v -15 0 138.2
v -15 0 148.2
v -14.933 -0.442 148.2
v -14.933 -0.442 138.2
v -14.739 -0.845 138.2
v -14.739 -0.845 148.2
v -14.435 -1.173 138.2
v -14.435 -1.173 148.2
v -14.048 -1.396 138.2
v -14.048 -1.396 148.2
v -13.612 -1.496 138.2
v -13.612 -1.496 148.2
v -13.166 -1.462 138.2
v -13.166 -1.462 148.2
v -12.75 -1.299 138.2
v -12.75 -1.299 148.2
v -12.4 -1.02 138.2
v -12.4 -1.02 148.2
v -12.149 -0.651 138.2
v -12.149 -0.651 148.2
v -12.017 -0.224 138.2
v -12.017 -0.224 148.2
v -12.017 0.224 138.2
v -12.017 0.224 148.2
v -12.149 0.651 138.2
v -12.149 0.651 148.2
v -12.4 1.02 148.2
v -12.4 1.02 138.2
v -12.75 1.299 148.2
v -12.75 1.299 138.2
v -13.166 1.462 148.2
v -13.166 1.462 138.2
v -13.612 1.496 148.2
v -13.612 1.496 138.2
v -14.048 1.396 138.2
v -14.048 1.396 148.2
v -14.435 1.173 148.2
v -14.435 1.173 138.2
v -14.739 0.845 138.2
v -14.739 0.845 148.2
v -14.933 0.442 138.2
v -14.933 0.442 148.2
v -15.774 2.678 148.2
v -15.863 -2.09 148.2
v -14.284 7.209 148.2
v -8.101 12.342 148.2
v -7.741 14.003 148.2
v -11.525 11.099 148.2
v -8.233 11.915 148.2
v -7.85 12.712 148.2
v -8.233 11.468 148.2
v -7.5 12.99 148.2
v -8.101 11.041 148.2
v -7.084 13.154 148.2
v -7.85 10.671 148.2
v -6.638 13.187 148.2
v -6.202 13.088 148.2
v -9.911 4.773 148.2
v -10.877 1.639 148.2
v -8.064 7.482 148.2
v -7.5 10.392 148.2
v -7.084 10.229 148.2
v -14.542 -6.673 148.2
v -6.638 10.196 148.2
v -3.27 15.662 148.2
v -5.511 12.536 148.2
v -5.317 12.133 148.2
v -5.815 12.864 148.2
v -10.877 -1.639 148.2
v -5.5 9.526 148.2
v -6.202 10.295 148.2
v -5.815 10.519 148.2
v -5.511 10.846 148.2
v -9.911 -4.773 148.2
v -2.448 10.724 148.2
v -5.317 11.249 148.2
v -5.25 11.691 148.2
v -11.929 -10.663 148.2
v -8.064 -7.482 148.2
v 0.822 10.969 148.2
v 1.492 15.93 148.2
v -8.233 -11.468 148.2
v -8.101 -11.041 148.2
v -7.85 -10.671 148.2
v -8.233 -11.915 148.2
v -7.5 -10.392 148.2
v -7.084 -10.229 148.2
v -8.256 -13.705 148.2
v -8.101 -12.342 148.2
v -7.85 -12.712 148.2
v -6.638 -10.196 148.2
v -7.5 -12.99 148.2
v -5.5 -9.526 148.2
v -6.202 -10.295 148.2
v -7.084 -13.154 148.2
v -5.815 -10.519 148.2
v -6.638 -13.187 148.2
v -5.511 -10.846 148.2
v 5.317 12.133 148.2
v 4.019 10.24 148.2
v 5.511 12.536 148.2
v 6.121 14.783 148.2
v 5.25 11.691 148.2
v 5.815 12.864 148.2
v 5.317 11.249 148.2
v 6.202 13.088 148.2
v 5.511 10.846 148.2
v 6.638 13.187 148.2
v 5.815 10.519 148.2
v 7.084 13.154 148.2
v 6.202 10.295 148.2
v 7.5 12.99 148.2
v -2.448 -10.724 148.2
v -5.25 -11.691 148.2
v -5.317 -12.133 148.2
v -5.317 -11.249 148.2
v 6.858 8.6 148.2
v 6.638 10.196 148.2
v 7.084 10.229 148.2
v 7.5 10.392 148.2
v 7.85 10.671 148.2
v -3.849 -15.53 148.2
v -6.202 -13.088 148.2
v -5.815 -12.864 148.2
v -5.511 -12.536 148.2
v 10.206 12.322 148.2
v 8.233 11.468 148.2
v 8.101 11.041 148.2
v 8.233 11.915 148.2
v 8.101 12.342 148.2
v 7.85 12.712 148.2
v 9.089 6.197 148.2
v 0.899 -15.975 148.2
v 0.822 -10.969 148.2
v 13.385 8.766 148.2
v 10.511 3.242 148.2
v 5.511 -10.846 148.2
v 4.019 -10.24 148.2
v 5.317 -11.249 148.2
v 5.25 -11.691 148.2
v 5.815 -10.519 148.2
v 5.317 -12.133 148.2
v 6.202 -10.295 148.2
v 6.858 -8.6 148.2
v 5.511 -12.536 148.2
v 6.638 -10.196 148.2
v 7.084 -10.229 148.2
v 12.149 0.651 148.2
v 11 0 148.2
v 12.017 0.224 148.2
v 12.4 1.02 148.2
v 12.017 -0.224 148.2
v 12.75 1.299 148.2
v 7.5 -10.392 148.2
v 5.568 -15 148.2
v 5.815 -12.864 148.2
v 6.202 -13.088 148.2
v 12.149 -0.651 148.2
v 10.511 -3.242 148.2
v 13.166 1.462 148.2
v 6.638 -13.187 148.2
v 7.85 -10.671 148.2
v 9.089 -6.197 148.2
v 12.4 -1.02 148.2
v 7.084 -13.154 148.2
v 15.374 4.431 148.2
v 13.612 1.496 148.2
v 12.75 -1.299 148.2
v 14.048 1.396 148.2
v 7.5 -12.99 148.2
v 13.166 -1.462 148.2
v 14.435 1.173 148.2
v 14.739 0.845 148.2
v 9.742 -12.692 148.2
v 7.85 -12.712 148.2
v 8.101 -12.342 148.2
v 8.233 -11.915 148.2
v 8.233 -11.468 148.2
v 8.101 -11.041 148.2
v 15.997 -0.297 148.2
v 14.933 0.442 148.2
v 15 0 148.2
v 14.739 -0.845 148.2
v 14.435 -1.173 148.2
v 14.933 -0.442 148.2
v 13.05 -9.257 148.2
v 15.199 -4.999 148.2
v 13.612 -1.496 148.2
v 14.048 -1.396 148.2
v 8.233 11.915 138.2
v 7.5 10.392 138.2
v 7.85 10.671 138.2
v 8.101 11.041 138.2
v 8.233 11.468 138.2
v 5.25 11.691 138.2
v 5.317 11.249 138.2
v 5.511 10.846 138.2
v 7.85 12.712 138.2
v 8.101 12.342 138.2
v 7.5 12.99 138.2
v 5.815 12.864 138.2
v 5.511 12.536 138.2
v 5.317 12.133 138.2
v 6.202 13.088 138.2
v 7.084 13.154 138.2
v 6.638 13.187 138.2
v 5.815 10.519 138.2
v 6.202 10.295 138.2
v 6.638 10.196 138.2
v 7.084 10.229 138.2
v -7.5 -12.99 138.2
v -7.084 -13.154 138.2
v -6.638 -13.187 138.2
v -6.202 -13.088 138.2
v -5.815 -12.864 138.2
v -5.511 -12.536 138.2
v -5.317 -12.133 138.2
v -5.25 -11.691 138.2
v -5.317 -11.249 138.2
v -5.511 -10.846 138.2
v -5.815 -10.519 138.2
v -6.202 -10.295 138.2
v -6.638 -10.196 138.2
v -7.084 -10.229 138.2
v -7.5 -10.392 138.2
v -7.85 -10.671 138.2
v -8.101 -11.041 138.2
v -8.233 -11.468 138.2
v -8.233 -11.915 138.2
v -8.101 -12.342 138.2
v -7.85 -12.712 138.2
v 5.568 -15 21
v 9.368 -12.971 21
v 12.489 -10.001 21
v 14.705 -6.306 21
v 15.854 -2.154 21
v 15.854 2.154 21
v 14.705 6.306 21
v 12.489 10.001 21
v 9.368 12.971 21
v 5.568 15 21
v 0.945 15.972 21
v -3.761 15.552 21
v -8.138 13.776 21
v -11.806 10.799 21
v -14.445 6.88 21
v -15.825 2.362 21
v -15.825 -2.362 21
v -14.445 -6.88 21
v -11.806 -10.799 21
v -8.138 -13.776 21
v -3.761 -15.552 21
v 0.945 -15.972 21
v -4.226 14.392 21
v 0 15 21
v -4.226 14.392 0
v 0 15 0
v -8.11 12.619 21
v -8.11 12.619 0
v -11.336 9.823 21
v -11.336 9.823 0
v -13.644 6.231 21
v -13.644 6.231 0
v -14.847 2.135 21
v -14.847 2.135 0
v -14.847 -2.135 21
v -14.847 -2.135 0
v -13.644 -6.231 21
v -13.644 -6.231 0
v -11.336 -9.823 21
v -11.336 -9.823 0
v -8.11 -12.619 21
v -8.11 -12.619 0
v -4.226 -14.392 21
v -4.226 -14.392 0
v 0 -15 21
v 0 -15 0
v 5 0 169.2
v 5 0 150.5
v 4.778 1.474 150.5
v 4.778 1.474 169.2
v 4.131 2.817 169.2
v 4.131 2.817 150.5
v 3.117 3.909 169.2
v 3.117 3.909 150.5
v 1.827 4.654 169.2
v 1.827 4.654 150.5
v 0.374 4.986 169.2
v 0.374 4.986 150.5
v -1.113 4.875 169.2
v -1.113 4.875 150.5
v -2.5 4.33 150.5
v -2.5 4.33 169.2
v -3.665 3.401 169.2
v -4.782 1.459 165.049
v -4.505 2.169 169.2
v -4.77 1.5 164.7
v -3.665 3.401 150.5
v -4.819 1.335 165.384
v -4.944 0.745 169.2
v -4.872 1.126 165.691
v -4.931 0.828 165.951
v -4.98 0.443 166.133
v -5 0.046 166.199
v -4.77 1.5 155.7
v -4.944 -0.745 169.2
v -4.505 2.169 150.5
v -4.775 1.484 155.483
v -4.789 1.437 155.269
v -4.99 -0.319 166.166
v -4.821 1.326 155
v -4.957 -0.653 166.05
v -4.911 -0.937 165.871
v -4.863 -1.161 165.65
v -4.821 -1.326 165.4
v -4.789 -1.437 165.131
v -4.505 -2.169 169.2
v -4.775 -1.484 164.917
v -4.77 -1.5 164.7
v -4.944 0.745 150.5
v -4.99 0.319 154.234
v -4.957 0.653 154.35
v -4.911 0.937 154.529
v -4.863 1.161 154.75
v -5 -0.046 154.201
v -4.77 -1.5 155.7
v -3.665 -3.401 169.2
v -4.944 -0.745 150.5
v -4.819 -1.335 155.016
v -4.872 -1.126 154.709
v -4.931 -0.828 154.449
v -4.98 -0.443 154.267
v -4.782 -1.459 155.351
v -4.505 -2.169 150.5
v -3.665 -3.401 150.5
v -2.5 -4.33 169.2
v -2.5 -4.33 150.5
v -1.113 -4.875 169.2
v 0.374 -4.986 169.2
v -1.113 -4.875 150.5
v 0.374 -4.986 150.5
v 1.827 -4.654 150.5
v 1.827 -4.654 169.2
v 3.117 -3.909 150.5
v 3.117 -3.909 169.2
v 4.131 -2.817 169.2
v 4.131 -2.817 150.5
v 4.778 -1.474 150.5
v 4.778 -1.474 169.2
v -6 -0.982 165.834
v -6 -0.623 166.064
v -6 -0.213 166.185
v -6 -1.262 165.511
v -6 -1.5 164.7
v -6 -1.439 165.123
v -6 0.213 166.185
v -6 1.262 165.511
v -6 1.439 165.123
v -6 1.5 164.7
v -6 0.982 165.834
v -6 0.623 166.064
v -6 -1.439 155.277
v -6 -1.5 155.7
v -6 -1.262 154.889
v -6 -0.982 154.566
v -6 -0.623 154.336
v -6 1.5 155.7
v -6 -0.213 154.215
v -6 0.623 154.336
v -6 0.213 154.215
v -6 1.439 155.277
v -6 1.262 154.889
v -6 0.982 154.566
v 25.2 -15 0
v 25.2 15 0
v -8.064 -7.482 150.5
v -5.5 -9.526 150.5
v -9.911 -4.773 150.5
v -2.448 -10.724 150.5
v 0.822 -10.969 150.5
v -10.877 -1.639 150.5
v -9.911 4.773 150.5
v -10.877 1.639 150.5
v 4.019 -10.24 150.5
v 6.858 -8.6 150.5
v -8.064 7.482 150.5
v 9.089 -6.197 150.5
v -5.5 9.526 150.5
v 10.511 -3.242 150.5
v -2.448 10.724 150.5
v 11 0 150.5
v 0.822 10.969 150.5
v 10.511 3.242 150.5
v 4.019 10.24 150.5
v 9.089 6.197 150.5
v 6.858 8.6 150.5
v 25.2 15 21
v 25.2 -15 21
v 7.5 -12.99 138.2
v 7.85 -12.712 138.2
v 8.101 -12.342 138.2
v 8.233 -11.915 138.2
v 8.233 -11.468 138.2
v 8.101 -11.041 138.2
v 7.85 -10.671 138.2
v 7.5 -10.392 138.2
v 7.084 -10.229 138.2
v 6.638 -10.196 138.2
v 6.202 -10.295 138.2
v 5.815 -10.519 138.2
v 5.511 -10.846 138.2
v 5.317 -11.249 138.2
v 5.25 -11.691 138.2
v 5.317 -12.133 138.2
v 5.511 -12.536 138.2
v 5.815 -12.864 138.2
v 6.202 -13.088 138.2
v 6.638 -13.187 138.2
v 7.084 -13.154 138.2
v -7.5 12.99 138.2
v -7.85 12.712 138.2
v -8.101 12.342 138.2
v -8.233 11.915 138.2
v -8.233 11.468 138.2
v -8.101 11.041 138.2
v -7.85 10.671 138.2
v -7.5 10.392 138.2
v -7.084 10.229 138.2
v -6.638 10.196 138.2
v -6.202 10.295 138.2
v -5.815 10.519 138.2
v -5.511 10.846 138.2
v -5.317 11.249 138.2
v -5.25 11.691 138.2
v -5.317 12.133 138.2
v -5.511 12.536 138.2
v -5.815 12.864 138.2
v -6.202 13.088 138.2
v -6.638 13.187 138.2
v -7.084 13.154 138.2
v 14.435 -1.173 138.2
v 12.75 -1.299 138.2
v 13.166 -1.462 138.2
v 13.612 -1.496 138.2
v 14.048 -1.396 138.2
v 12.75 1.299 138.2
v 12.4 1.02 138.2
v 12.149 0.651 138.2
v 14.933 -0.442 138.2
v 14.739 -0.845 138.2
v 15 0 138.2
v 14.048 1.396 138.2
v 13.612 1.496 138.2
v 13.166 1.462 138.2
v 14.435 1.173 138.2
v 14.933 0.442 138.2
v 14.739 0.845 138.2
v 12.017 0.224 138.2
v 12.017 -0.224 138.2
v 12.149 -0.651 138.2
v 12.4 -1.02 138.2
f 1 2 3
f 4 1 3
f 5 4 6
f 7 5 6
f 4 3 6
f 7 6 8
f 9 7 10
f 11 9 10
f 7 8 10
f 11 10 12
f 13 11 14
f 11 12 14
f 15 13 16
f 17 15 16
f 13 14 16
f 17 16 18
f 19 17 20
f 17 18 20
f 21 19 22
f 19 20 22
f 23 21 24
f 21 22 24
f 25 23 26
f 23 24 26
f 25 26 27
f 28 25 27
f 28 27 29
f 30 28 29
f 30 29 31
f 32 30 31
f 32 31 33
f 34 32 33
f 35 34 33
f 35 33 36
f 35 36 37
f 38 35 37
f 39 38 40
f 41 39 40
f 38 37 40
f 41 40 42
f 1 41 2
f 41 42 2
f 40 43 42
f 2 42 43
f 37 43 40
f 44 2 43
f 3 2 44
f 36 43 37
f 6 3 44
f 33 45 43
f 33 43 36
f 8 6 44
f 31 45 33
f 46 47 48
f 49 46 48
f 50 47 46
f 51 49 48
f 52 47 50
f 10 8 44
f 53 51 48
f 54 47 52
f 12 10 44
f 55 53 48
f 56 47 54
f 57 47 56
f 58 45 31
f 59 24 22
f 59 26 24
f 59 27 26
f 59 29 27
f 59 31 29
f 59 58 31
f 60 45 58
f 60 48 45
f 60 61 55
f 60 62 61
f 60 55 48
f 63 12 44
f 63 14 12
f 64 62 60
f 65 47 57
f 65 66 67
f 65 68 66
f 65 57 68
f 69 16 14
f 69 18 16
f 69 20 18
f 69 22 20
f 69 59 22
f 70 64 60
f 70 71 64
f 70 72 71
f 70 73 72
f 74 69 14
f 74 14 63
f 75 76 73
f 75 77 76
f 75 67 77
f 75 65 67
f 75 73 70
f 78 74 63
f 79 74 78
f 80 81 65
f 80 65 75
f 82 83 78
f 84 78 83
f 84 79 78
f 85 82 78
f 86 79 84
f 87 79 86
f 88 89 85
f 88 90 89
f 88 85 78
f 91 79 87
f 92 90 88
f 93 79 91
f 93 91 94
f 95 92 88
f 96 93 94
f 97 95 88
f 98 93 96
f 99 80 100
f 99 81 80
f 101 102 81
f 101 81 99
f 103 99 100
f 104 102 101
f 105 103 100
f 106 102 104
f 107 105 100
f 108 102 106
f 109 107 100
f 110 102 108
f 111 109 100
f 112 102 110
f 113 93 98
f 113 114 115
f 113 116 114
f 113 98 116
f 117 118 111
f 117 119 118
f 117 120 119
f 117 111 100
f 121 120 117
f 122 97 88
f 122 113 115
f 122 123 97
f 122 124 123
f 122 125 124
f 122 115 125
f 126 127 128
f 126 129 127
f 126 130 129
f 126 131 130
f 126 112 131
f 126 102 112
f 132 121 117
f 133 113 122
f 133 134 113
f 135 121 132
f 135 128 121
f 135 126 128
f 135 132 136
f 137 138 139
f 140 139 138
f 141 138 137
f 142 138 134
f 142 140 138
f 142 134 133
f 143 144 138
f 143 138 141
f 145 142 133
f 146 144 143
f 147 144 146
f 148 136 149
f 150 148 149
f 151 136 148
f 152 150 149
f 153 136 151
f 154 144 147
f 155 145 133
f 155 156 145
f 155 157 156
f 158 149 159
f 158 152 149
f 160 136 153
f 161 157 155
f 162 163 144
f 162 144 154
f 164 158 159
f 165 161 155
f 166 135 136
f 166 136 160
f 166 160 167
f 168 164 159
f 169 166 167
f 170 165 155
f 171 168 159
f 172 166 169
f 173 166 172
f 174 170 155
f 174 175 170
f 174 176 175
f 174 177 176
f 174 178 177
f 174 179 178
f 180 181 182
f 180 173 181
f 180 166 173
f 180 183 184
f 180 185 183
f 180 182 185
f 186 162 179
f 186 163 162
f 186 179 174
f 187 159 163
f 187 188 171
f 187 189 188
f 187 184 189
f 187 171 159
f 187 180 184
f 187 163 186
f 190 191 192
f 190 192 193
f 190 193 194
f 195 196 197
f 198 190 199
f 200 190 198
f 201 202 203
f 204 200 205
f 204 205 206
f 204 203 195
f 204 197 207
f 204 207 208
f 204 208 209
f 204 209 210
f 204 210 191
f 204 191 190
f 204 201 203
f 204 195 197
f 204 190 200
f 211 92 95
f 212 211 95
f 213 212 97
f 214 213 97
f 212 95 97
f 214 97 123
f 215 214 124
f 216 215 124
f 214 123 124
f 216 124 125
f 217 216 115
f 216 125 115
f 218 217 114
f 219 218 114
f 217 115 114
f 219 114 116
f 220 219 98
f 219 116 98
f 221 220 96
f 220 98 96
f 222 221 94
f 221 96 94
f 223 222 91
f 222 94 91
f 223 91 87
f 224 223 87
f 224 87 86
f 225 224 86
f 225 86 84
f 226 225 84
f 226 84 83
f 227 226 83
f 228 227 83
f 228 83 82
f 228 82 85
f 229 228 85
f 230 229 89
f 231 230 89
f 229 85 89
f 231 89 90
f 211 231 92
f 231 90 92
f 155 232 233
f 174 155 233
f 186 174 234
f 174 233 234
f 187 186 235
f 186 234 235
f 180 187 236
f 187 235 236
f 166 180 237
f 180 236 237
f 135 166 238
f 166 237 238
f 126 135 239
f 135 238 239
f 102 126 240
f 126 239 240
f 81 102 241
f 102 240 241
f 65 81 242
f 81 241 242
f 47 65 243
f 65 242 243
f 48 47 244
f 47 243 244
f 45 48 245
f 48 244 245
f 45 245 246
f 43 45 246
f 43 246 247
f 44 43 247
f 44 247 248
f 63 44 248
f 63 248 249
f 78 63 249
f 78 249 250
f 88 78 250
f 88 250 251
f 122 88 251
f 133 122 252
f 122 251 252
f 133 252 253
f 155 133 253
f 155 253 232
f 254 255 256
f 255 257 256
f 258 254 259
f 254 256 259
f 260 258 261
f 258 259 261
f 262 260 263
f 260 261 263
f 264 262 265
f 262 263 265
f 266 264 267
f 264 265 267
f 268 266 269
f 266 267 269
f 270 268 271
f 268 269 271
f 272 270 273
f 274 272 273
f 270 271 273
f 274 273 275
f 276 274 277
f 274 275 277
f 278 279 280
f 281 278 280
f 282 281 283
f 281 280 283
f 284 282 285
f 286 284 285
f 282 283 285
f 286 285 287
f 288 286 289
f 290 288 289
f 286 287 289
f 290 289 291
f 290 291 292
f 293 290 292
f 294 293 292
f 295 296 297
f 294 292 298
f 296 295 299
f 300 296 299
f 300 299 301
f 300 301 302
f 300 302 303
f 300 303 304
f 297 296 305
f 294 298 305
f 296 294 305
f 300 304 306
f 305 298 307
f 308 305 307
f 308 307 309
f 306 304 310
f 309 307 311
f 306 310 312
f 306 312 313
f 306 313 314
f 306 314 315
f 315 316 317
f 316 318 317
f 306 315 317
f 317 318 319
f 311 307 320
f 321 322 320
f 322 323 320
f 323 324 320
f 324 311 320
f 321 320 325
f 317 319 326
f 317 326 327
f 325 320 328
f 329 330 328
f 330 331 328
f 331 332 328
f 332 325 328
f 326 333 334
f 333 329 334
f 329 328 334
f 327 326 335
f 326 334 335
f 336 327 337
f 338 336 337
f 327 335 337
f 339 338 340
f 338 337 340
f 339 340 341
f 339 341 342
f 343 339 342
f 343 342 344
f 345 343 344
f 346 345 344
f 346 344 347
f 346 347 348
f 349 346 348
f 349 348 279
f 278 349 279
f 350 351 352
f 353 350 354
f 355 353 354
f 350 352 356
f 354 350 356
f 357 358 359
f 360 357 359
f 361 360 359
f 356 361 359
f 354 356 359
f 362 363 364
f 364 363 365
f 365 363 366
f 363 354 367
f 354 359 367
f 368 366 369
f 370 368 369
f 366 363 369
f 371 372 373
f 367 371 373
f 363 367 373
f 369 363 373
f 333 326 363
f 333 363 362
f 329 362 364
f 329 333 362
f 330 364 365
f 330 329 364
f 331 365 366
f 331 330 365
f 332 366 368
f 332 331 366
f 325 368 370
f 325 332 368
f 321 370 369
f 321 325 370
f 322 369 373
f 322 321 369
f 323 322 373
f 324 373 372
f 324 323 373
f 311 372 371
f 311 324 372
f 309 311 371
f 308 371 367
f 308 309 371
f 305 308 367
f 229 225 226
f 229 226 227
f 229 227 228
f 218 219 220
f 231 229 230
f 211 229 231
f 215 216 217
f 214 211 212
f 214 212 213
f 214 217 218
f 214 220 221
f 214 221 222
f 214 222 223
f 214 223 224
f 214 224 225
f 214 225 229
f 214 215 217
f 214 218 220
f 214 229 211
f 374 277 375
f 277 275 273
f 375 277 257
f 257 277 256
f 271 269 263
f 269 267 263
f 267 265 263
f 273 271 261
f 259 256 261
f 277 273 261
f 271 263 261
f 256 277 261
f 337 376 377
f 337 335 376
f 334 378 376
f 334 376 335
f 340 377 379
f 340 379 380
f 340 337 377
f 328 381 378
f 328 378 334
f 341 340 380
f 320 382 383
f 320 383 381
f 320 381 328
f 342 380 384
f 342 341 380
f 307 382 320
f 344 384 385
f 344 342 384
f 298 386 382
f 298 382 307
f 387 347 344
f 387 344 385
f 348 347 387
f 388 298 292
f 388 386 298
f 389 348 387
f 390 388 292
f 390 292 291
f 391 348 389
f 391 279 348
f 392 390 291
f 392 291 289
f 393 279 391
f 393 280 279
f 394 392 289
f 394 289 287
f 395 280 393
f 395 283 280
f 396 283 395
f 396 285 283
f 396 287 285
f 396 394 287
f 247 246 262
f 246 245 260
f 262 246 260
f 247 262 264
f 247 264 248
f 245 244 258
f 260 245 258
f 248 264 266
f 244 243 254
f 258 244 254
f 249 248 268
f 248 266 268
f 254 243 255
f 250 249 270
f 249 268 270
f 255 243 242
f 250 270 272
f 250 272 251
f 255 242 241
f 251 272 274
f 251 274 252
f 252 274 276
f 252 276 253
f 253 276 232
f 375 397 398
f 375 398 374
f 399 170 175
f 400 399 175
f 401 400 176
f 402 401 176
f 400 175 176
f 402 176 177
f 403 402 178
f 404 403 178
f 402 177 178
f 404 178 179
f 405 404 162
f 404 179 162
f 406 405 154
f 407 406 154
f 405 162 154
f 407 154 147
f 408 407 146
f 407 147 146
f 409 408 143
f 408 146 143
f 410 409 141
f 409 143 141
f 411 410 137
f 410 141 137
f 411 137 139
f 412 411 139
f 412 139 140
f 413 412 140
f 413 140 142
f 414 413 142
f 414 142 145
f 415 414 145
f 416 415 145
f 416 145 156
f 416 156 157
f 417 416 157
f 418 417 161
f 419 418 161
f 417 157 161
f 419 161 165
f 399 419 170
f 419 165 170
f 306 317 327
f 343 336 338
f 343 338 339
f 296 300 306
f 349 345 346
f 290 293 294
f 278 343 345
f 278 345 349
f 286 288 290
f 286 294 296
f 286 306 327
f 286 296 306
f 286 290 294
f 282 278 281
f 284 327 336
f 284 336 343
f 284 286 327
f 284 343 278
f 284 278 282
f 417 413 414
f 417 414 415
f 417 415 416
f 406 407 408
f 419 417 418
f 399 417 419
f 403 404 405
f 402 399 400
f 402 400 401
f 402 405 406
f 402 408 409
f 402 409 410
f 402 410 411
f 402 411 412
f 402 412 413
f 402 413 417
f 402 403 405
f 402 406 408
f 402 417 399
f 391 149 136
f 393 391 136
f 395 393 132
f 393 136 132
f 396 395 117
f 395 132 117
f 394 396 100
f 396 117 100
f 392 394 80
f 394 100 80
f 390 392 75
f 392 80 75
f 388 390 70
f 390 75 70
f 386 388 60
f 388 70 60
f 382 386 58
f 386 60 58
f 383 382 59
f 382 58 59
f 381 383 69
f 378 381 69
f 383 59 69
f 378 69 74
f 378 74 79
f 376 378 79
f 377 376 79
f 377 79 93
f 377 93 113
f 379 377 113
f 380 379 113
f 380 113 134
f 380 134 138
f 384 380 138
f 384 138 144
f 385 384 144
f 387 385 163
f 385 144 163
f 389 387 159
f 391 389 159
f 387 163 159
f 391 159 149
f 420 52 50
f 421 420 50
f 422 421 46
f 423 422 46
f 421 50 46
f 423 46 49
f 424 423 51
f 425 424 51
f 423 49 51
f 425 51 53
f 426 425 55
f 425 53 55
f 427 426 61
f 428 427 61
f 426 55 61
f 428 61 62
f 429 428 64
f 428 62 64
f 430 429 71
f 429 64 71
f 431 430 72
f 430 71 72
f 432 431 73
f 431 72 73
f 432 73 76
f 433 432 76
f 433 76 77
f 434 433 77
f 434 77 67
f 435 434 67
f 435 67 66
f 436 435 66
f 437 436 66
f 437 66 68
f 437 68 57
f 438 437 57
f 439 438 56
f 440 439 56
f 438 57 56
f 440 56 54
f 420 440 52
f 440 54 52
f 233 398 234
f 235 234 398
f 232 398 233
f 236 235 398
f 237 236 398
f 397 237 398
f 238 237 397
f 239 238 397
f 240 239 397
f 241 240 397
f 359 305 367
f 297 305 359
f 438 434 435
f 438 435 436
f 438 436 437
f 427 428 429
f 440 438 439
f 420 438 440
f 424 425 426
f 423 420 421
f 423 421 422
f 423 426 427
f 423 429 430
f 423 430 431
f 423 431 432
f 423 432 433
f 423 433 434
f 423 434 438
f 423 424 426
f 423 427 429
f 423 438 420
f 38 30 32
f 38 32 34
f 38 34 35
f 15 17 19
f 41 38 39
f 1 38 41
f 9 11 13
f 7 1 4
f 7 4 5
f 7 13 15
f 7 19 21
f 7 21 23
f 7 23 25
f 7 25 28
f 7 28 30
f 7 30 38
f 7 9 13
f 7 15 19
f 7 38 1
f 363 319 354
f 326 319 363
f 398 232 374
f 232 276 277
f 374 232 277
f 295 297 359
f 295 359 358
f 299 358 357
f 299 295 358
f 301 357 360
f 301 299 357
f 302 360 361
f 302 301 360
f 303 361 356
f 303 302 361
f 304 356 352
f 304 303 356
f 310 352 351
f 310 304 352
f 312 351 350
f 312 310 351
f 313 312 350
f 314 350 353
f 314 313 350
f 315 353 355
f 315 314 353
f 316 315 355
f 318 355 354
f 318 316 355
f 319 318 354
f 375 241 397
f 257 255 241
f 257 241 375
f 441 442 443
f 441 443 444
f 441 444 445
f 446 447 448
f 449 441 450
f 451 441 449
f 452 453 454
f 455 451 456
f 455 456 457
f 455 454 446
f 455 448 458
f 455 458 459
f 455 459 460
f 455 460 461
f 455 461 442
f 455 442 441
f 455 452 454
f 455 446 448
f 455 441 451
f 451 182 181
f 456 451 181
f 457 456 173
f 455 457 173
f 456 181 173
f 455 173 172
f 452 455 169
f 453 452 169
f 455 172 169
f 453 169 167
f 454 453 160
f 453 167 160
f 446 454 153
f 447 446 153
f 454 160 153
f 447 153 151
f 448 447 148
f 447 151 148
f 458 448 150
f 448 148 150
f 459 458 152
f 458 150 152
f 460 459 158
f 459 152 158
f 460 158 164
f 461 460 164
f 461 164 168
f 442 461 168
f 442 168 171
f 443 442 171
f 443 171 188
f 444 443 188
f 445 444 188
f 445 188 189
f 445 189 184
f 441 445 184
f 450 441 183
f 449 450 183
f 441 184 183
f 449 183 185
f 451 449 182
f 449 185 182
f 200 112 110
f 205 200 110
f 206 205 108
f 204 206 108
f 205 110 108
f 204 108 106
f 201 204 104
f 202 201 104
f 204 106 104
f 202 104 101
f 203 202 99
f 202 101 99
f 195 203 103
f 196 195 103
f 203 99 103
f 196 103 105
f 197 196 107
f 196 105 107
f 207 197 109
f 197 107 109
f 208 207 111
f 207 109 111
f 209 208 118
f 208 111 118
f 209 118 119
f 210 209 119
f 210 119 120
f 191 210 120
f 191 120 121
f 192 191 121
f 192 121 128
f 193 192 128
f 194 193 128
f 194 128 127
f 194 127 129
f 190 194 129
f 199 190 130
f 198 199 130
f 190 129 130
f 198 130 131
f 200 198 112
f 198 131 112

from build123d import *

# Parameters (mm, degrees)
SKETCH1_R           = 15
BOSS_EXTRUDE1_DEPTH = 21
SKETCH2_W           = 21
SKETCH2_H           = 30
BOSS_EXTRUDE2_DEPTH = 25.2
SKETCH3_R           = 16
BOSS_EXTRUDE3_DEPTH = 127.2
SKETCH4_R           = 11
BOSS_EXTRUDE4_DEPTH = 2.3
SKETCH6_R           = 5
BOSS_EXTRUDE6_DEPTH = 18.7
BOSS_EXTRUDE7_DEPTH = 6
SKETCH7_R           = 1.5
CUT_EXTRUDE1_DEPTH  = 10
CIRPATTERN1_COUNT   = 6


with BuildPart() as part:
    # Sketch1 → Boss-Extrude1 (new body)
    with BuildSketch(Plane.XY):
        with Locations(Location((0, 0, 0), (0, 0, 180))):
            Circle(SKETCH1_R)
    extrude(amount=BOSS_EXTRUDE1_DEPTH)

    # Sketch2 → Boss-Extrude2 (add)
    with BuildSketch(Plane(origin=(0, 0, 0), x_dir=(0, 0, -1), z_dir=(1, 0, 0))):
        with Locations((-10.5, 0)):
            Rectangle(SKETCH2_W, SKETCH2_H)
    extrude(amount=BOSS_EXTRUDE2_DEPTH)

    # Sketch3 → Boss-Extrude3 (add)
    with BuildSketch(Plane.XY.offset(21)):
        with Locations(Location((0, 0, 0), (0, 0, 290.364134806))):
            Circle(SKETCH3_R)
    extrude(amount=BOSS_EXTRUDE3_DEPTH)

    # Sketch4 → Boss-Extrude4 (add)
    with BuildSketch(Plane.XY.offset(148.2)):
        Circle(SKETCH4_R)
    extrude(amount=BOSS_EXTRUDE4_DEPTH)

    # Sketch6 → Boss-Extrude6 (add)
    with BuildSketch(Plane.XY.offset(150.5)):
        Circle(SKETCH6_R)
    extrude(amount=BOSS_EXTRUDE6_DEPTH)

    # Sketch5 → Boss-Extrude7 (add)
    with BuildSketch(Plane(origin=(0, 0, 0), x_dir=(0, 0, -1), z_dir=(1, 0, 0))):
        with BuildLine():
            Line((-155.7, 1.5), (-164.7, 1.5))
            ThreePointArc((-164.7, 1.5), (-166.2, 0), (-164.7, -1.5))
            Line((-164.7, -1.5), (-155.7, -1.5))
            ThreePointArc((-155.7, -1.5), (-154.2, 0), (-155.7, 1.5))
        make_face()
    extrude(amount=-BOSS_EXTRUDE7_DEPTH)

    # Sketch7 → Cut-Extrude1 (cut)
    with BuildSketch(Plane.XY.offset(148.2)):
        with Locations((13.5, 0)):
            Circle(SKETCH7_R)
    cut_extrude1 = extrude(amount=-CUT_EXTRUDE1_DEPTH, mode=Mode.SUBTRACT)

    # CirPattern1: Cut-Extrude1 ×6 about axis
    cirpattern1_axis = Axis((0, 0, 0), (0, 0, 1))
    for i in range(1, CIRPATTERN1_COUNT):
        add(cut_extrude1.rotate(cirpattern1_axis, i * 360 / CIRPATTERN1_COUNT), mode=Mode.SUBTRACT)


solid = part.part
